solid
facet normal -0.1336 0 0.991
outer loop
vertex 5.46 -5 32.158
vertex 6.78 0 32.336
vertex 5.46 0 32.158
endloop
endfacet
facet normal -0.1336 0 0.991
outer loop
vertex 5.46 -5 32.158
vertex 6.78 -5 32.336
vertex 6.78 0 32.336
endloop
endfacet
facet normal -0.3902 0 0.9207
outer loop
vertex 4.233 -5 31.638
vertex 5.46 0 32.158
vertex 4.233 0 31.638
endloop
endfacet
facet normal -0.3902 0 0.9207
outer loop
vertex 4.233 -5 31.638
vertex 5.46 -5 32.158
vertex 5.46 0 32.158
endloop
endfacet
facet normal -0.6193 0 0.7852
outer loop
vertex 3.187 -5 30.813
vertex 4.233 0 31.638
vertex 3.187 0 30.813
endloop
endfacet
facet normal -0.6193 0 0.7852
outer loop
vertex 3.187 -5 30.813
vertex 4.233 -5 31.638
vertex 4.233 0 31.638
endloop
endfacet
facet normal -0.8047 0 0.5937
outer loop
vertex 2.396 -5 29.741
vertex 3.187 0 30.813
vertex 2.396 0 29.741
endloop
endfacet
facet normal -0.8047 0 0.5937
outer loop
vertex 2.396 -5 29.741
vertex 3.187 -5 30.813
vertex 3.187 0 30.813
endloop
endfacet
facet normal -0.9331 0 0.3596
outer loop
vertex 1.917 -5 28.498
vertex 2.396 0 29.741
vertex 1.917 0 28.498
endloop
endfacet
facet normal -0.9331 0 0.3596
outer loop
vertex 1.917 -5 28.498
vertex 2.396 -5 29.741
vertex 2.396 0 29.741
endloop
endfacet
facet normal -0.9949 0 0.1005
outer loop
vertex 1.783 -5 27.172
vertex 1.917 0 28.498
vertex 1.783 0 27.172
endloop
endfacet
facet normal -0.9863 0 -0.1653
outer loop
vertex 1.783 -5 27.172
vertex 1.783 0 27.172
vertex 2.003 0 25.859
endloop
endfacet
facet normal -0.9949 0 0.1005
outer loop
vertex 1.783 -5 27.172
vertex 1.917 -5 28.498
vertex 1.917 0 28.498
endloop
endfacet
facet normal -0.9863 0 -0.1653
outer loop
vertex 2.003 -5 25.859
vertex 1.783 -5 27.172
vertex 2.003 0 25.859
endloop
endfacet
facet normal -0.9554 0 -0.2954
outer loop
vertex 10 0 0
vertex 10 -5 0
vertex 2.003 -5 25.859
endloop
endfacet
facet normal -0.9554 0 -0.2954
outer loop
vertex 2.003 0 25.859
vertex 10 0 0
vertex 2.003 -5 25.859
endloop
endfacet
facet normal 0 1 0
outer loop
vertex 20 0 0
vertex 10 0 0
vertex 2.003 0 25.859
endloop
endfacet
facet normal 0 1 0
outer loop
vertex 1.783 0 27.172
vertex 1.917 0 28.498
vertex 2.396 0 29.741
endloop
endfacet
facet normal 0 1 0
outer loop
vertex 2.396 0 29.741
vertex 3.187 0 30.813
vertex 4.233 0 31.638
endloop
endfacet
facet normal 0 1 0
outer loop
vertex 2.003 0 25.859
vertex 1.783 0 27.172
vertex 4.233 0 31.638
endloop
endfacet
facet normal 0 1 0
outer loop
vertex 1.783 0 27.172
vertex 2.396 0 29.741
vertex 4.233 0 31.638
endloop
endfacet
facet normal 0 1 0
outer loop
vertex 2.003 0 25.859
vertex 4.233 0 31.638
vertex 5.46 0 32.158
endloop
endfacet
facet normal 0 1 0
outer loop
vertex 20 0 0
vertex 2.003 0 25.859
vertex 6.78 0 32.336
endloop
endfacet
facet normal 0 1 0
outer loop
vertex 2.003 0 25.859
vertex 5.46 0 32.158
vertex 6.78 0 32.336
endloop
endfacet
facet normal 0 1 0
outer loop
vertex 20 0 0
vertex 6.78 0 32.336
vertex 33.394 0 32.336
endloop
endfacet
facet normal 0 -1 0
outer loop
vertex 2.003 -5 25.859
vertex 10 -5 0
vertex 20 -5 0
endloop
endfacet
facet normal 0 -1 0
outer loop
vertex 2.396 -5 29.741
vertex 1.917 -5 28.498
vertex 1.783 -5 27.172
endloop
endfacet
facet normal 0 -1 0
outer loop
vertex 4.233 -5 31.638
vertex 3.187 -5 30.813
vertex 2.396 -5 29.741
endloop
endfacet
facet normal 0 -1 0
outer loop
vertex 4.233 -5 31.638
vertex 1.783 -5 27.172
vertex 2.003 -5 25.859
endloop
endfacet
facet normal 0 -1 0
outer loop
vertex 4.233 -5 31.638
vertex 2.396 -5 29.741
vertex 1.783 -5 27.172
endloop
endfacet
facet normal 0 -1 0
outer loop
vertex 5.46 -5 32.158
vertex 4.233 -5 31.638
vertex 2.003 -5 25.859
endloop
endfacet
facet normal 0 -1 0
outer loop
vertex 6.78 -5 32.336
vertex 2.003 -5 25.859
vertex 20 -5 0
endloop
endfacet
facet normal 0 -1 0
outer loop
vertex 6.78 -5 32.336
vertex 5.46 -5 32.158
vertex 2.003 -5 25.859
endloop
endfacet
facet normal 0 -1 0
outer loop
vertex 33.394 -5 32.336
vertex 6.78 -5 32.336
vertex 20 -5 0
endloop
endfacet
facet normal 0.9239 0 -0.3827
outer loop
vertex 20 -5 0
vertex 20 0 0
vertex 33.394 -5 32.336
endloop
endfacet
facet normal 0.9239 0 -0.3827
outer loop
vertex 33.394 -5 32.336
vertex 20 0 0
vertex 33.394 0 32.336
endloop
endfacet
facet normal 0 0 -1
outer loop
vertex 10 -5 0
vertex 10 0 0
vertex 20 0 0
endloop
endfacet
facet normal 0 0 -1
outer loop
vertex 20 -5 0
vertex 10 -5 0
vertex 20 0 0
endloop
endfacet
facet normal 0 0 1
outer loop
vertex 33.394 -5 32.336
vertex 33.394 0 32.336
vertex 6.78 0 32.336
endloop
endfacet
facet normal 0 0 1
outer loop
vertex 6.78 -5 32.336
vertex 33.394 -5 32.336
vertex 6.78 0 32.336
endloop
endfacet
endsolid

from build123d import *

# Parameters (mm, degrees)
F0_W     = 20
F0_H     = 32.335784
F1_DEPTH = 5
F3_DEPTH = 25
F4_R     = 5


with BuildPart() as f1:
    # F0 (on Front) → F1 (new body)
    with BuildSketch(Plane.XZ):
        with Locations((10, 16.167892)):
            Rectangle(F0_W, F0_H)
        Polygon((20, 32.335784), (20, 0), (33.39392, 32.335784), align=None)
    extrude(amount=F1_DEPTH)

    # F2 (on face) → F3 (cut)
    with BuildSketch(Plane.XZ.offset(5)):
        Polygon((10, 0), (0, 32.335784), (0, 0), align=None)
    extrude(amount=-F3_DEPTH, mode=Mode.SUBTRACT)

    # F4
    f4_edges = [f1.edges().sort_by_distance(p)[0] for p in [
        (0, -2.5, 32.335784),
    ]]
    fillet(f4_edges, radius=F4_R)


solid = f1.part
